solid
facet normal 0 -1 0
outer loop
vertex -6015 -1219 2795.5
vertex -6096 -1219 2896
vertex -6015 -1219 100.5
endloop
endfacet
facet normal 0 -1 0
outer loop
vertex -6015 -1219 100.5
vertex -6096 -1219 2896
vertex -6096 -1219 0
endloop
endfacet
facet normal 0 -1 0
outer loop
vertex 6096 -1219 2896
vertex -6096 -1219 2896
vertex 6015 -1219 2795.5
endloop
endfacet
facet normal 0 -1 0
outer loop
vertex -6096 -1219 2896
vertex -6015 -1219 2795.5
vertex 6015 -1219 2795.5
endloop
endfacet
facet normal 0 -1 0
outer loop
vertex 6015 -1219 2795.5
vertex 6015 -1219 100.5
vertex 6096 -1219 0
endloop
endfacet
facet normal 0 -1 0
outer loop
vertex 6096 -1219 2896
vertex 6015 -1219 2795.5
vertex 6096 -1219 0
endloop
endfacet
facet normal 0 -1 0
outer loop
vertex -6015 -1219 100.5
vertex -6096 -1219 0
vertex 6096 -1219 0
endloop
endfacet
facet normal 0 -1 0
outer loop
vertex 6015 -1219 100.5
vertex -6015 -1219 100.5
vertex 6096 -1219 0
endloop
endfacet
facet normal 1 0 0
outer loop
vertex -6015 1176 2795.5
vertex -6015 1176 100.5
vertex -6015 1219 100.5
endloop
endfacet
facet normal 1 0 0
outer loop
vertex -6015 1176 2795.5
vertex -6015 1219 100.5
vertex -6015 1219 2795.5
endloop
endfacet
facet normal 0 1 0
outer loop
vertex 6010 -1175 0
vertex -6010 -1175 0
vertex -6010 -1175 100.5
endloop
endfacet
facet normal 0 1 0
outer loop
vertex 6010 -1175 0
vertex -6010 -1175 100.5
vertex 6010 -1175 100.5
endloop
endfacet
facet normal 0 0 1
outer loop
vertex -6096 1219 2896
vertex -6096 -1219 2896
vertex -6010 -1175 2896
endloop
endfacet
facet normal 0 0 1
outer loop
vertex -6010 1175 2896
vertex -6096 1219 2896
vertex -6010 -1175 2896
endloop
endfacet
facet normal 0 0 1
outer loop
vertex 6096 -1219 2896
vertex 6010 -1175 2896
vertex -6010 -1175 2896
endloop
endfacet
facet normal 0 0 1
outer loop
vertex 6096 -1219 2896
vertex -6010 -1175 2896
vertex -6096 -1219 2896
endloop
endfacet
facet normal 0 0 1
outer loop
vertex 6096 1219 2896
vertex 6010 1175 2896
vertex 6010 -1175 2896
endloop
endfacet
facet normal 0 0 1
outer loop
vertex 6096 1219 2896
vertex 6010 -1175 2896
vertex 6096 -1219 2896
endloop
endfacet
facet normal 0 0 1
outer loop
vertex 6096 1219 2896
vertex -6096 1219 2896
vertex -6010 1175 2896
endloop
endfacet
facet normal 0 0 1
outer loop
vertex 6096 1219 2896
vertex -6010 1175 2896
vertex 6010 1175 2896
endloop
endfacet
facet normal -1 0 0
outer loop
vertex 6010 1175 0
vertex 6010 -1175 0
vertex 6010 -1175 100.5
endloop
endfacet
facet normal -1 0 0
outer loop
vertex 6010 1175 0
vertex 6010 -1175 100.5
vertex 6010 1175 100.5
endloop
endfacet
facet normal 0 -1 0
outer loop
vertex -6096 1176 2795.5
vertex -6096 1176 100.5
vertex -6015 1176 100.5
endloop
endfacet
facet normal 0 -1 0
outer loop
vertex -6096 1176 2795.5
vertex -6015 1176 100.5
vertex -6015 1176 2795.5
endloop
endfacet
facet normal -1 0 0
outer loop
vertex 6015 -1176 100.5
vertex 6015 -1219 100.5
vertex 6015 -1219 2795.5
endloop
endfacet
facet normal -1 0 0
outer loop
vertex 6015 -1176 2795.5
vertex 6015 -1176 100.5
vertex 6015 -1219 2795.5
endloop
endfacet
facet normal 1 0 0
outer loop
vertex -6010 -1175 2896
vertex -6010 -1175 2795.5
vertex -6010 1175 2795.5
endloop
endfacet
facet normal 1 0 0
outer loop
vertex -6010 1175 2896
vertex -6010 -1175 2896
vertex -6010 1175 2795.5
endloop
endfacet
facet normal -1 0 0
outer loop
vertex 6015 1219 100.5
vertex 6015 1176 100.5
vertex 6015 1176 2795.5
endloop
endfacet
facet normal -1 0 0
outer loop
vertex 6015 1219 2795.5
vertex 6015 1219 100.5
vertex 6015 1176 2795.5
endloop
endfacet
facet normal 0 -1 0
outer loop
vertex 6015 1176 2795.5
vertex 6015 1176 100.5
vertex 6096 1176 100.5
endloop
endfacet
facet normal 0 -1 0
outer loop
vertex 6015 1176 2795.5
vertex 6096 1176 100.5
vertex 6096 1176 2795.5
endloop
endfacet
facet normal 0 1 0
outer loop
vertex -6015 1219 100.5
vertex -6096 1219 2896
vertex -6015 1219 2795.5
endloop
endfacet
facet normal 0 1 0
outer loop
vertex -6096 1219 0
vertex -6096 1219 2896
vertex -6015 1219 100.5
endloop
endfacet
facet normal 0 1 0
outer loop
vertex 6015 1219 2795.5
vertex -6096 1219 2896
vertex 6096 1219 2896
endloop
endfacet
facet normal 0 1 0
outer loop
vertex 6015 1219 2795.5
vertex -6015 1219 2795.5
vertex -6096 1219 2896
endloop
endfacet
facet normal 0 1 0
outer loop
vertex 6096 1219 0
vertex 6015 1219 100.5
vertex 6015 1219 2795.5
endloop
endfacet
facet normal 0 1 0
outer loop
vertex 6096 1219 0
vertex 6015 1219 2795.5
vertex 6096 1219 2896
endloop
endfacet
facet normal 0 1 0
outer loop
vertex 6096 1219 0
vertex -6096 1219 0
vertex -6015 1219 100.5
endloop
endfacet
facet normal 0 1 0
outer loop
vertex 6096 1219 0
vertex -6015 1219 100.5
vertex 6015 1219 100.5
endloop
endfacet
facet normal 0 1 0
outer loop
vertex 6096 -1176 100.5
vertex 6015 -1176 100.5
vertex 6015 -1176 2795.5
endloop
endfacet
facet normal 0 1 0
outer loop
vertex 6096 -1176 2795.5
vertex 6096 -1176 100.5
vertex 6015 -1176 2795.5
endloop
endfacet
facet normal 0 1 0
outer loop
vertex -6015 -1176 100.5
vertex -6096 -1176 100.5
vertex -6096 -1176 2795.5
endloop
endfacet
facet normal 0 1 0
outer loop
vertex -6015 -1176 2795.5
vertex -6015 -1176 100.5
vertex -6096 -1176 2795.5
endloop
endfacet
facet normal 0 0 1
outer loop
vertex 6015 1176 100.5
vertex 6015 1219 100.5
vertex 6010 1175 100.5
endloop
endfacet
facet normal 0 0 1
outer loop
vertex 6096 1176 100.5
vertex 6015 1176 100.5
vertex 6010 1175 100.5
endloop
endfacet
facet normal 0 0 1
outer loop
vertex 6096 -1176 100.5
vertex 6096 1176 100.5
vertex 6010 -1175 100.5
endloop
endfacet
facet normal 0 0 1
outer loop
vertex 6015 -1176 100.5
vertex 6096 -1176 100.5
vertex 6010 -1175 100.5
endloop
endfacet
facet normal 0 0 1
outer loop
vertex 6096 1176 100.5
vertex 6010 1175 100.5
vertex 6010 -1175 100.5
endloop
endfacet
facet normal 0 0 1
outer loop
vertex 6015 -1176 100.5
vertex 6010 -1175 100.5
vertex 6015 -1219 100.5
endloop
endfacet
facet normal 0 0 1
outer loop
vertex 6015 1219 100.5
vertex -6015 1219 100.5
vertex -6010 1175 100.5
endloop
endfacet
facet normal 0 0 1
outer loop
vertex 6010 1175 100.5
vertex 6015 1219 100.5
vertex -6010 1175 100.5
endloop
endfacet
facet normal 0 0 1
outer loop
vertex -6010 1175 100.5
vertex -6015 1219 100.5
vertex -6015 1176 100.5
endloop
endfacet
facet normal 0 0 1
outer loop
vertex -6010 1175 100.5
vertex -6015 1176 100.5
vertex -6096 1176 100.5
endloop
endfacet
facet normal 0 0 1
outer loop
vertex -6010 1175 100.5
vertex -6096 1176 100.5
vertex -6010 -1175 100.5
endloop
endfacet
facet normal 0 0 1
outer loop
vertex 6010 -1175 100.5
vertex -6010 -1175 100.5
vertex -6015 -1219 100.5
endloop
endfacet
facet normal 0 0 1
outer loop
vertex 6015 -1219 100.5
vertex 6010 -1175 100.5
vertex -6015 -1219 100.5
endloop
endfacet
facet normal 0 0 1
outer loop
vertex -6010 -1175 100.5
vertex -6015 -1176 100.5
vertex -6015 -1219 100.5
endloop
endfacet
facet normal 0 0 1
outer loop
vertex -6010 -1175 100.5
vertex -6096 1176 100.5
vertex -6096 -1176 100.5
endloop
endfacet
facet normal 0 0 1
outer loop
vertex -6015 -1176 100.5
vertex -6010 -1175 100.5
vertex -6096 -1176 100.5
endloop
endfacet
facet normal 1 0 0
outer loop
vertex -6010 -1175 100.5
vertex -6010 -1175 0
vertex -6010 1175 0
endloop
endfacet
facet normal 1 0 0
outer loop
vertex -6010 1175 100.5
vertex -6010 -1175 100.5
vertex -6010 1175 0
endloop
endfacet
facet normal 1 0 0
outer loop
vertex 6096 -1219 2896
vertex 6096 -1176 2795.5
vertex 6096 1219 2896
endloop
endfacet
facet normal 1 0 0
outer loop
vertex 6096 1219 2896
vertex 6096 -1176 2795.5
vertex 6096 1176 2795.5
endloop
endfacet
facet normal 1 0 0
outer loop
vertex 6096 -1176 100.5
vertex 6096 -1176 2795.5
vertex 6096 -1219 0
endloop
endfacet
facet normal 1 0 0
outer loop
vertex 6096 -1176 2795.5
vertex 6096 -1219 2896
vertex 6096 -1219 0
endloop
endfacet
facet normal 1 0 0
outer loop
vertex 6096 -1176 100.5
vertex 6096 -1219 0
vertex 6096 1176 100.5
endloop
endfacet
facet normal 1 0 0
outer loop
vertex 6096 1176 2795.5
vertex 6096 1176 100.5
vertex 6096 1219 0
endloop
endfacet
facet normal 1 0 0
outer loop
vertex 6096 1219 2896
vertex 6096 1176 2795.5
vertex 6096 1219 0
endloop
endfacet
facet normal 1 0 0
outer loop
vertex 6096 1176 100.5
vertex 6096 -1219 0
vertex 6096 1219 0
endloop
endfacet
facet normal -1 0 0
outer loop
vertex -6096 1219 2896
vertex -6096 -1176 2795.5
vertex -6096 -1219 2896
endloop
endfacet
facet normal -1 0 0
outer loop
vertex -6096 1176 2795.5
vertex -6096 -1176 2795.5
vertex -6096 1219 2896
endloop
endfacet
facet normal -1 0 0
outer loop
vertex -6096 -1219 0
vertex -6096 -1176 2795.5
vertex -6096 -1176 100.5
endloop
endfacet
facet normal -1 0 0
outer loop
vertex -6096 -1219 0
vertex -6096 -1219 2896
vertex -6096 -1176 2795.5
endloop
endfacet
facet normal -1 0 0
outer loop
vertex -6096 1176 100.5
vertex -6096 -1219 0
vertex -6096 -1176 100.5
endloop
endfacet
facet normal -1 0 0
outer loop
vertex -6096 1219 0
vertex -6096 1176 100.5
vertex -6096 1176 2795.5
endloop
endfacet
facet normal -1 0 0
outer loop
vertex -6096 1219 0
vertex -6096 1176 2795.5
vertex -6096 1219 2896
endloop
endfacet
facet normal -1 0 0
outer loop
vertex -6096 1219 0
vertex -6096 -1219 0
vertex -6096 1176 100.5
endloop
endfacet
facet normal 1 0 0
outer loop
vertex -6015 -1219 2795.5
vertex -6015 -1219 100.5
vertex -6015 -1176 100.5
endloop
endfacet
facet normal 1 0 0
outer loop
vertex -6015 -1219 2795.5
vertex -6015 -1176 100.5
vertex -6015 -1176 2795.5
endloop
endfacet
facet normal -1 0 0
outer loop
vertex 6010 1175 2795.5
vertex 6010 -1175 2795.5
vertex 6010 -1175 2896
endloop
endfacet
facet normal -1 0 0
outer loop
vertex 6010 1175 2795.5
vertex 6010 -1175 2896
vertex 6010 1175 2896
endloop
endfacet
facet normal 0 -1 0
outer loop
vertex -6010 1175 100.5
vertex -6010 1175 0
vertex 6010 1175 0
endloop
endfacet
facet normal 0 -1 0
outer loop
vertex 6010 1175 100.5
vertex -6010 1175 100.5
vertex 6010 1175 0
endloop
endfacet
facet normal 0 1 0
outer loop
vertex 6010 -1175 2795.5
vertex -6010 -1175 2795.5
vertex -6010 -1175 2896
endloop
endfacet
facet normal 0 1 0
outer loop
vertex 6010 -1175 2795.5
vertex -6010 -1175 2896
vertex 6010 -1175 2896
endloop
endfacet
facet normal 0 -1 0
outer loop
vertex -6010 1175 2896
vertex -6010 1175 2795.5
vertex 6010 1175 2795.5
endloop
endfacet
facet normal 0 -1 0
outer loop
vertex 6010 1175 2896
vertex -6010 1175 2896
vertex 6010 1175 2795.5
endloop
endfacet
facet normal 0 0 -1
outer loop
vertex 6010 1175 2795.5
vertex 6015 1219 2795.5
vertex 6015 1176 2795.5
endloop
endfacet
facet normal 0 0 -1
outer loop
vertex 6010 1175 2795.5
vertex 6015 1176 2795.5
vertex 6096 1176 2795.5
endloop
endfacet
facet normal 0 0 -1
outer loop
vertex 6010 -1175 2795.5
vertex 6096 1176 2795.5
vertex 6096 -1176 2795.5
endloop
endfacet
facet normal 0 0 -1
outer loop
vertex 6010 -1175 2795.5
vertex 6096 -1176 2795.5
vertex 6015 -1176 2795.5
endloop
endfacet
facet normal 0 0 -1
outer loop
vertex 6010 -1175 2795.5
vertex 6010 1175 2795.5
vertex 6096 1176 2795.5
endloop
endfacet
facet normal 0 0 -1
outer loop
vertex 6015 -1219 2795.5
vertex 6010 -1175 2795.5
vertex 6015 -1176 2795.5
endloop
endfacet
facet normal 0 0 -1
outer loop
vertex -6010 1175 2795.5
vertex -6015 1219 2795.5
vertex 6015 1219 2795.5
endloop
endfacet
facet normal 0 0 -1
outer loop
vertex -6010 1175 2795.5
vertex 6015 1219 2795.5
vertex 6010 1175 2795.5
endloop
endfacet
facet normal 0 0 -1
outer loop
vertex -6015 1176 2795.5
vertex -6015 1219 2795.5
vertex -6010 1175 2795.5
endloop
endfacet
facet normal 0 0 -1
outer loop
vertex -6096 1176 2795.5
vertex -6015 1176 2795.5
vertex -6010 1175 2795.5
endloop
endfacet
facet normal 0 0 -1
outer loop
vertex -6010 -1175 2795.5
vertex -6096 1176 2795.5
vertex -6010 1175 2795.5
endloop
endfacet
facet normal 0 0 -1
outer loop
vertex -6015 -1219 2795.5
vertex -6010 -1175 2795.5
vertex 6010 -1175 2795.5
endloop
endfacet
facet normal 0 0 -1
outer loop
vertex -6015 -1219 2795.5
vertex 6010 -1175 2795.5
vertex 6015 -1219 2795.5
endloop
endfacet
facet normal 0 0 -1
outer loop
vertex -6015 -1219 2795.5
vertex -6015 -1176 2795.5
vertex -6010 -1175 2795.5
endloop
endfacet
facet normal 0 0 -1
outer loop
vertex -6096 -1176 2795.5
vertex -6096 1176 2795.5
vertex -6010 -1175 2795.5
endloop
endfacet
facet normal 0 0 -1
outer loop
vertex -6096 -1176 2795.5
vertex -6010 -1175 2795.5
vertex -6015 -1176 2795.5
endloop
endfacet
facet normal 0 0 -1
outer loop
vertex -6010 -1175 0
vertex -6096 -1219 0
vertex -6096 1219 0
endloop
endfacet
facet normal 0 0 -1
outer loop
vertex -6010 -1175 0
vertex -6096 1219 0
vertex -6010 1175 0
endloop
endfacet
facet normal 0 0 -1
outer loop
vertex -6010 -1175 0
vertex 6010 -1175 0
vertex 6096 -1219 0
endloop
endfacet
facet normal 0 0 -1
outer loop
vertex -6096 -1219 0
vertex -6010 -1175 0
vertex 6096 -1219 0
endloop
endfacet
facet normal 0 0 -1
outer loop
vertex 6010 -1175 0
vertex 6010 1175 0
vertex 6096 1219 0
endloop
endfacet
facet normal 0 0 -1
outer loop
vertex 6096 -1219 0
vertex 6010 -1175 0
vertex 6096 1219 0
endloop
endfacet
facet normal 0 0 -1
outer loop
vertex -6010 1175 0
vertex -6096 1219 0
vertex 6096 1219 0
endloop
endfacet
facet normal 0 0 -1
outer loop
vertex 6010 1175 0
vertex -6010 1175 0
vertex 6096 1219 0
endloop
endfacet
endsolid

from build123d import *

# Parameters (mm, degrees)
F4_W     = 12192
F4_H     = 2438
F4_W_2   = 12020
F4_H_2   = 2350
F0_DEPTH = 2896
F1_W     = 12030
F1_H     = 2695
F5_DEPTH = 2438.001
F2_W     = 2352
F2_H     = 2695
F3_DEPTH = 12192.001


with BuildPart() as f0:
    # F4 (on Top) → F0 (new body)
    with BuildSketch(Plane.XY):
        Rectangle(F4_W, F4_H)
        Rectangle(F4_W_2, F4_H_2, mode=Mode.SUBTRACT)
    extrude(amount=F0_DEPTH)

    # F1 (on face) → F5 (cut, through all)
    with BuildSketch(Plane.XZ.offset(1219)):
        with Locations((0, 1448)):
            Rectangle(F1_W, F1_H)
    extrude(amount=-F5_DEPTH, mode=Mode.SUBTRACT)

    # F2 (on face) → F3 (cut, through all)
    with BuildSketch(Plane(origin=(-6096, 0, 0), x_dir=(0, -1, 0), z_dir=(-1, 0, 0))):
        with Locations((0, 1448)):
            Rectangle(F2_W, F2_H)
    extrude(amount=-F3_DEPTH, mode=Mode.SUBTRACT)


solid = f0.part
